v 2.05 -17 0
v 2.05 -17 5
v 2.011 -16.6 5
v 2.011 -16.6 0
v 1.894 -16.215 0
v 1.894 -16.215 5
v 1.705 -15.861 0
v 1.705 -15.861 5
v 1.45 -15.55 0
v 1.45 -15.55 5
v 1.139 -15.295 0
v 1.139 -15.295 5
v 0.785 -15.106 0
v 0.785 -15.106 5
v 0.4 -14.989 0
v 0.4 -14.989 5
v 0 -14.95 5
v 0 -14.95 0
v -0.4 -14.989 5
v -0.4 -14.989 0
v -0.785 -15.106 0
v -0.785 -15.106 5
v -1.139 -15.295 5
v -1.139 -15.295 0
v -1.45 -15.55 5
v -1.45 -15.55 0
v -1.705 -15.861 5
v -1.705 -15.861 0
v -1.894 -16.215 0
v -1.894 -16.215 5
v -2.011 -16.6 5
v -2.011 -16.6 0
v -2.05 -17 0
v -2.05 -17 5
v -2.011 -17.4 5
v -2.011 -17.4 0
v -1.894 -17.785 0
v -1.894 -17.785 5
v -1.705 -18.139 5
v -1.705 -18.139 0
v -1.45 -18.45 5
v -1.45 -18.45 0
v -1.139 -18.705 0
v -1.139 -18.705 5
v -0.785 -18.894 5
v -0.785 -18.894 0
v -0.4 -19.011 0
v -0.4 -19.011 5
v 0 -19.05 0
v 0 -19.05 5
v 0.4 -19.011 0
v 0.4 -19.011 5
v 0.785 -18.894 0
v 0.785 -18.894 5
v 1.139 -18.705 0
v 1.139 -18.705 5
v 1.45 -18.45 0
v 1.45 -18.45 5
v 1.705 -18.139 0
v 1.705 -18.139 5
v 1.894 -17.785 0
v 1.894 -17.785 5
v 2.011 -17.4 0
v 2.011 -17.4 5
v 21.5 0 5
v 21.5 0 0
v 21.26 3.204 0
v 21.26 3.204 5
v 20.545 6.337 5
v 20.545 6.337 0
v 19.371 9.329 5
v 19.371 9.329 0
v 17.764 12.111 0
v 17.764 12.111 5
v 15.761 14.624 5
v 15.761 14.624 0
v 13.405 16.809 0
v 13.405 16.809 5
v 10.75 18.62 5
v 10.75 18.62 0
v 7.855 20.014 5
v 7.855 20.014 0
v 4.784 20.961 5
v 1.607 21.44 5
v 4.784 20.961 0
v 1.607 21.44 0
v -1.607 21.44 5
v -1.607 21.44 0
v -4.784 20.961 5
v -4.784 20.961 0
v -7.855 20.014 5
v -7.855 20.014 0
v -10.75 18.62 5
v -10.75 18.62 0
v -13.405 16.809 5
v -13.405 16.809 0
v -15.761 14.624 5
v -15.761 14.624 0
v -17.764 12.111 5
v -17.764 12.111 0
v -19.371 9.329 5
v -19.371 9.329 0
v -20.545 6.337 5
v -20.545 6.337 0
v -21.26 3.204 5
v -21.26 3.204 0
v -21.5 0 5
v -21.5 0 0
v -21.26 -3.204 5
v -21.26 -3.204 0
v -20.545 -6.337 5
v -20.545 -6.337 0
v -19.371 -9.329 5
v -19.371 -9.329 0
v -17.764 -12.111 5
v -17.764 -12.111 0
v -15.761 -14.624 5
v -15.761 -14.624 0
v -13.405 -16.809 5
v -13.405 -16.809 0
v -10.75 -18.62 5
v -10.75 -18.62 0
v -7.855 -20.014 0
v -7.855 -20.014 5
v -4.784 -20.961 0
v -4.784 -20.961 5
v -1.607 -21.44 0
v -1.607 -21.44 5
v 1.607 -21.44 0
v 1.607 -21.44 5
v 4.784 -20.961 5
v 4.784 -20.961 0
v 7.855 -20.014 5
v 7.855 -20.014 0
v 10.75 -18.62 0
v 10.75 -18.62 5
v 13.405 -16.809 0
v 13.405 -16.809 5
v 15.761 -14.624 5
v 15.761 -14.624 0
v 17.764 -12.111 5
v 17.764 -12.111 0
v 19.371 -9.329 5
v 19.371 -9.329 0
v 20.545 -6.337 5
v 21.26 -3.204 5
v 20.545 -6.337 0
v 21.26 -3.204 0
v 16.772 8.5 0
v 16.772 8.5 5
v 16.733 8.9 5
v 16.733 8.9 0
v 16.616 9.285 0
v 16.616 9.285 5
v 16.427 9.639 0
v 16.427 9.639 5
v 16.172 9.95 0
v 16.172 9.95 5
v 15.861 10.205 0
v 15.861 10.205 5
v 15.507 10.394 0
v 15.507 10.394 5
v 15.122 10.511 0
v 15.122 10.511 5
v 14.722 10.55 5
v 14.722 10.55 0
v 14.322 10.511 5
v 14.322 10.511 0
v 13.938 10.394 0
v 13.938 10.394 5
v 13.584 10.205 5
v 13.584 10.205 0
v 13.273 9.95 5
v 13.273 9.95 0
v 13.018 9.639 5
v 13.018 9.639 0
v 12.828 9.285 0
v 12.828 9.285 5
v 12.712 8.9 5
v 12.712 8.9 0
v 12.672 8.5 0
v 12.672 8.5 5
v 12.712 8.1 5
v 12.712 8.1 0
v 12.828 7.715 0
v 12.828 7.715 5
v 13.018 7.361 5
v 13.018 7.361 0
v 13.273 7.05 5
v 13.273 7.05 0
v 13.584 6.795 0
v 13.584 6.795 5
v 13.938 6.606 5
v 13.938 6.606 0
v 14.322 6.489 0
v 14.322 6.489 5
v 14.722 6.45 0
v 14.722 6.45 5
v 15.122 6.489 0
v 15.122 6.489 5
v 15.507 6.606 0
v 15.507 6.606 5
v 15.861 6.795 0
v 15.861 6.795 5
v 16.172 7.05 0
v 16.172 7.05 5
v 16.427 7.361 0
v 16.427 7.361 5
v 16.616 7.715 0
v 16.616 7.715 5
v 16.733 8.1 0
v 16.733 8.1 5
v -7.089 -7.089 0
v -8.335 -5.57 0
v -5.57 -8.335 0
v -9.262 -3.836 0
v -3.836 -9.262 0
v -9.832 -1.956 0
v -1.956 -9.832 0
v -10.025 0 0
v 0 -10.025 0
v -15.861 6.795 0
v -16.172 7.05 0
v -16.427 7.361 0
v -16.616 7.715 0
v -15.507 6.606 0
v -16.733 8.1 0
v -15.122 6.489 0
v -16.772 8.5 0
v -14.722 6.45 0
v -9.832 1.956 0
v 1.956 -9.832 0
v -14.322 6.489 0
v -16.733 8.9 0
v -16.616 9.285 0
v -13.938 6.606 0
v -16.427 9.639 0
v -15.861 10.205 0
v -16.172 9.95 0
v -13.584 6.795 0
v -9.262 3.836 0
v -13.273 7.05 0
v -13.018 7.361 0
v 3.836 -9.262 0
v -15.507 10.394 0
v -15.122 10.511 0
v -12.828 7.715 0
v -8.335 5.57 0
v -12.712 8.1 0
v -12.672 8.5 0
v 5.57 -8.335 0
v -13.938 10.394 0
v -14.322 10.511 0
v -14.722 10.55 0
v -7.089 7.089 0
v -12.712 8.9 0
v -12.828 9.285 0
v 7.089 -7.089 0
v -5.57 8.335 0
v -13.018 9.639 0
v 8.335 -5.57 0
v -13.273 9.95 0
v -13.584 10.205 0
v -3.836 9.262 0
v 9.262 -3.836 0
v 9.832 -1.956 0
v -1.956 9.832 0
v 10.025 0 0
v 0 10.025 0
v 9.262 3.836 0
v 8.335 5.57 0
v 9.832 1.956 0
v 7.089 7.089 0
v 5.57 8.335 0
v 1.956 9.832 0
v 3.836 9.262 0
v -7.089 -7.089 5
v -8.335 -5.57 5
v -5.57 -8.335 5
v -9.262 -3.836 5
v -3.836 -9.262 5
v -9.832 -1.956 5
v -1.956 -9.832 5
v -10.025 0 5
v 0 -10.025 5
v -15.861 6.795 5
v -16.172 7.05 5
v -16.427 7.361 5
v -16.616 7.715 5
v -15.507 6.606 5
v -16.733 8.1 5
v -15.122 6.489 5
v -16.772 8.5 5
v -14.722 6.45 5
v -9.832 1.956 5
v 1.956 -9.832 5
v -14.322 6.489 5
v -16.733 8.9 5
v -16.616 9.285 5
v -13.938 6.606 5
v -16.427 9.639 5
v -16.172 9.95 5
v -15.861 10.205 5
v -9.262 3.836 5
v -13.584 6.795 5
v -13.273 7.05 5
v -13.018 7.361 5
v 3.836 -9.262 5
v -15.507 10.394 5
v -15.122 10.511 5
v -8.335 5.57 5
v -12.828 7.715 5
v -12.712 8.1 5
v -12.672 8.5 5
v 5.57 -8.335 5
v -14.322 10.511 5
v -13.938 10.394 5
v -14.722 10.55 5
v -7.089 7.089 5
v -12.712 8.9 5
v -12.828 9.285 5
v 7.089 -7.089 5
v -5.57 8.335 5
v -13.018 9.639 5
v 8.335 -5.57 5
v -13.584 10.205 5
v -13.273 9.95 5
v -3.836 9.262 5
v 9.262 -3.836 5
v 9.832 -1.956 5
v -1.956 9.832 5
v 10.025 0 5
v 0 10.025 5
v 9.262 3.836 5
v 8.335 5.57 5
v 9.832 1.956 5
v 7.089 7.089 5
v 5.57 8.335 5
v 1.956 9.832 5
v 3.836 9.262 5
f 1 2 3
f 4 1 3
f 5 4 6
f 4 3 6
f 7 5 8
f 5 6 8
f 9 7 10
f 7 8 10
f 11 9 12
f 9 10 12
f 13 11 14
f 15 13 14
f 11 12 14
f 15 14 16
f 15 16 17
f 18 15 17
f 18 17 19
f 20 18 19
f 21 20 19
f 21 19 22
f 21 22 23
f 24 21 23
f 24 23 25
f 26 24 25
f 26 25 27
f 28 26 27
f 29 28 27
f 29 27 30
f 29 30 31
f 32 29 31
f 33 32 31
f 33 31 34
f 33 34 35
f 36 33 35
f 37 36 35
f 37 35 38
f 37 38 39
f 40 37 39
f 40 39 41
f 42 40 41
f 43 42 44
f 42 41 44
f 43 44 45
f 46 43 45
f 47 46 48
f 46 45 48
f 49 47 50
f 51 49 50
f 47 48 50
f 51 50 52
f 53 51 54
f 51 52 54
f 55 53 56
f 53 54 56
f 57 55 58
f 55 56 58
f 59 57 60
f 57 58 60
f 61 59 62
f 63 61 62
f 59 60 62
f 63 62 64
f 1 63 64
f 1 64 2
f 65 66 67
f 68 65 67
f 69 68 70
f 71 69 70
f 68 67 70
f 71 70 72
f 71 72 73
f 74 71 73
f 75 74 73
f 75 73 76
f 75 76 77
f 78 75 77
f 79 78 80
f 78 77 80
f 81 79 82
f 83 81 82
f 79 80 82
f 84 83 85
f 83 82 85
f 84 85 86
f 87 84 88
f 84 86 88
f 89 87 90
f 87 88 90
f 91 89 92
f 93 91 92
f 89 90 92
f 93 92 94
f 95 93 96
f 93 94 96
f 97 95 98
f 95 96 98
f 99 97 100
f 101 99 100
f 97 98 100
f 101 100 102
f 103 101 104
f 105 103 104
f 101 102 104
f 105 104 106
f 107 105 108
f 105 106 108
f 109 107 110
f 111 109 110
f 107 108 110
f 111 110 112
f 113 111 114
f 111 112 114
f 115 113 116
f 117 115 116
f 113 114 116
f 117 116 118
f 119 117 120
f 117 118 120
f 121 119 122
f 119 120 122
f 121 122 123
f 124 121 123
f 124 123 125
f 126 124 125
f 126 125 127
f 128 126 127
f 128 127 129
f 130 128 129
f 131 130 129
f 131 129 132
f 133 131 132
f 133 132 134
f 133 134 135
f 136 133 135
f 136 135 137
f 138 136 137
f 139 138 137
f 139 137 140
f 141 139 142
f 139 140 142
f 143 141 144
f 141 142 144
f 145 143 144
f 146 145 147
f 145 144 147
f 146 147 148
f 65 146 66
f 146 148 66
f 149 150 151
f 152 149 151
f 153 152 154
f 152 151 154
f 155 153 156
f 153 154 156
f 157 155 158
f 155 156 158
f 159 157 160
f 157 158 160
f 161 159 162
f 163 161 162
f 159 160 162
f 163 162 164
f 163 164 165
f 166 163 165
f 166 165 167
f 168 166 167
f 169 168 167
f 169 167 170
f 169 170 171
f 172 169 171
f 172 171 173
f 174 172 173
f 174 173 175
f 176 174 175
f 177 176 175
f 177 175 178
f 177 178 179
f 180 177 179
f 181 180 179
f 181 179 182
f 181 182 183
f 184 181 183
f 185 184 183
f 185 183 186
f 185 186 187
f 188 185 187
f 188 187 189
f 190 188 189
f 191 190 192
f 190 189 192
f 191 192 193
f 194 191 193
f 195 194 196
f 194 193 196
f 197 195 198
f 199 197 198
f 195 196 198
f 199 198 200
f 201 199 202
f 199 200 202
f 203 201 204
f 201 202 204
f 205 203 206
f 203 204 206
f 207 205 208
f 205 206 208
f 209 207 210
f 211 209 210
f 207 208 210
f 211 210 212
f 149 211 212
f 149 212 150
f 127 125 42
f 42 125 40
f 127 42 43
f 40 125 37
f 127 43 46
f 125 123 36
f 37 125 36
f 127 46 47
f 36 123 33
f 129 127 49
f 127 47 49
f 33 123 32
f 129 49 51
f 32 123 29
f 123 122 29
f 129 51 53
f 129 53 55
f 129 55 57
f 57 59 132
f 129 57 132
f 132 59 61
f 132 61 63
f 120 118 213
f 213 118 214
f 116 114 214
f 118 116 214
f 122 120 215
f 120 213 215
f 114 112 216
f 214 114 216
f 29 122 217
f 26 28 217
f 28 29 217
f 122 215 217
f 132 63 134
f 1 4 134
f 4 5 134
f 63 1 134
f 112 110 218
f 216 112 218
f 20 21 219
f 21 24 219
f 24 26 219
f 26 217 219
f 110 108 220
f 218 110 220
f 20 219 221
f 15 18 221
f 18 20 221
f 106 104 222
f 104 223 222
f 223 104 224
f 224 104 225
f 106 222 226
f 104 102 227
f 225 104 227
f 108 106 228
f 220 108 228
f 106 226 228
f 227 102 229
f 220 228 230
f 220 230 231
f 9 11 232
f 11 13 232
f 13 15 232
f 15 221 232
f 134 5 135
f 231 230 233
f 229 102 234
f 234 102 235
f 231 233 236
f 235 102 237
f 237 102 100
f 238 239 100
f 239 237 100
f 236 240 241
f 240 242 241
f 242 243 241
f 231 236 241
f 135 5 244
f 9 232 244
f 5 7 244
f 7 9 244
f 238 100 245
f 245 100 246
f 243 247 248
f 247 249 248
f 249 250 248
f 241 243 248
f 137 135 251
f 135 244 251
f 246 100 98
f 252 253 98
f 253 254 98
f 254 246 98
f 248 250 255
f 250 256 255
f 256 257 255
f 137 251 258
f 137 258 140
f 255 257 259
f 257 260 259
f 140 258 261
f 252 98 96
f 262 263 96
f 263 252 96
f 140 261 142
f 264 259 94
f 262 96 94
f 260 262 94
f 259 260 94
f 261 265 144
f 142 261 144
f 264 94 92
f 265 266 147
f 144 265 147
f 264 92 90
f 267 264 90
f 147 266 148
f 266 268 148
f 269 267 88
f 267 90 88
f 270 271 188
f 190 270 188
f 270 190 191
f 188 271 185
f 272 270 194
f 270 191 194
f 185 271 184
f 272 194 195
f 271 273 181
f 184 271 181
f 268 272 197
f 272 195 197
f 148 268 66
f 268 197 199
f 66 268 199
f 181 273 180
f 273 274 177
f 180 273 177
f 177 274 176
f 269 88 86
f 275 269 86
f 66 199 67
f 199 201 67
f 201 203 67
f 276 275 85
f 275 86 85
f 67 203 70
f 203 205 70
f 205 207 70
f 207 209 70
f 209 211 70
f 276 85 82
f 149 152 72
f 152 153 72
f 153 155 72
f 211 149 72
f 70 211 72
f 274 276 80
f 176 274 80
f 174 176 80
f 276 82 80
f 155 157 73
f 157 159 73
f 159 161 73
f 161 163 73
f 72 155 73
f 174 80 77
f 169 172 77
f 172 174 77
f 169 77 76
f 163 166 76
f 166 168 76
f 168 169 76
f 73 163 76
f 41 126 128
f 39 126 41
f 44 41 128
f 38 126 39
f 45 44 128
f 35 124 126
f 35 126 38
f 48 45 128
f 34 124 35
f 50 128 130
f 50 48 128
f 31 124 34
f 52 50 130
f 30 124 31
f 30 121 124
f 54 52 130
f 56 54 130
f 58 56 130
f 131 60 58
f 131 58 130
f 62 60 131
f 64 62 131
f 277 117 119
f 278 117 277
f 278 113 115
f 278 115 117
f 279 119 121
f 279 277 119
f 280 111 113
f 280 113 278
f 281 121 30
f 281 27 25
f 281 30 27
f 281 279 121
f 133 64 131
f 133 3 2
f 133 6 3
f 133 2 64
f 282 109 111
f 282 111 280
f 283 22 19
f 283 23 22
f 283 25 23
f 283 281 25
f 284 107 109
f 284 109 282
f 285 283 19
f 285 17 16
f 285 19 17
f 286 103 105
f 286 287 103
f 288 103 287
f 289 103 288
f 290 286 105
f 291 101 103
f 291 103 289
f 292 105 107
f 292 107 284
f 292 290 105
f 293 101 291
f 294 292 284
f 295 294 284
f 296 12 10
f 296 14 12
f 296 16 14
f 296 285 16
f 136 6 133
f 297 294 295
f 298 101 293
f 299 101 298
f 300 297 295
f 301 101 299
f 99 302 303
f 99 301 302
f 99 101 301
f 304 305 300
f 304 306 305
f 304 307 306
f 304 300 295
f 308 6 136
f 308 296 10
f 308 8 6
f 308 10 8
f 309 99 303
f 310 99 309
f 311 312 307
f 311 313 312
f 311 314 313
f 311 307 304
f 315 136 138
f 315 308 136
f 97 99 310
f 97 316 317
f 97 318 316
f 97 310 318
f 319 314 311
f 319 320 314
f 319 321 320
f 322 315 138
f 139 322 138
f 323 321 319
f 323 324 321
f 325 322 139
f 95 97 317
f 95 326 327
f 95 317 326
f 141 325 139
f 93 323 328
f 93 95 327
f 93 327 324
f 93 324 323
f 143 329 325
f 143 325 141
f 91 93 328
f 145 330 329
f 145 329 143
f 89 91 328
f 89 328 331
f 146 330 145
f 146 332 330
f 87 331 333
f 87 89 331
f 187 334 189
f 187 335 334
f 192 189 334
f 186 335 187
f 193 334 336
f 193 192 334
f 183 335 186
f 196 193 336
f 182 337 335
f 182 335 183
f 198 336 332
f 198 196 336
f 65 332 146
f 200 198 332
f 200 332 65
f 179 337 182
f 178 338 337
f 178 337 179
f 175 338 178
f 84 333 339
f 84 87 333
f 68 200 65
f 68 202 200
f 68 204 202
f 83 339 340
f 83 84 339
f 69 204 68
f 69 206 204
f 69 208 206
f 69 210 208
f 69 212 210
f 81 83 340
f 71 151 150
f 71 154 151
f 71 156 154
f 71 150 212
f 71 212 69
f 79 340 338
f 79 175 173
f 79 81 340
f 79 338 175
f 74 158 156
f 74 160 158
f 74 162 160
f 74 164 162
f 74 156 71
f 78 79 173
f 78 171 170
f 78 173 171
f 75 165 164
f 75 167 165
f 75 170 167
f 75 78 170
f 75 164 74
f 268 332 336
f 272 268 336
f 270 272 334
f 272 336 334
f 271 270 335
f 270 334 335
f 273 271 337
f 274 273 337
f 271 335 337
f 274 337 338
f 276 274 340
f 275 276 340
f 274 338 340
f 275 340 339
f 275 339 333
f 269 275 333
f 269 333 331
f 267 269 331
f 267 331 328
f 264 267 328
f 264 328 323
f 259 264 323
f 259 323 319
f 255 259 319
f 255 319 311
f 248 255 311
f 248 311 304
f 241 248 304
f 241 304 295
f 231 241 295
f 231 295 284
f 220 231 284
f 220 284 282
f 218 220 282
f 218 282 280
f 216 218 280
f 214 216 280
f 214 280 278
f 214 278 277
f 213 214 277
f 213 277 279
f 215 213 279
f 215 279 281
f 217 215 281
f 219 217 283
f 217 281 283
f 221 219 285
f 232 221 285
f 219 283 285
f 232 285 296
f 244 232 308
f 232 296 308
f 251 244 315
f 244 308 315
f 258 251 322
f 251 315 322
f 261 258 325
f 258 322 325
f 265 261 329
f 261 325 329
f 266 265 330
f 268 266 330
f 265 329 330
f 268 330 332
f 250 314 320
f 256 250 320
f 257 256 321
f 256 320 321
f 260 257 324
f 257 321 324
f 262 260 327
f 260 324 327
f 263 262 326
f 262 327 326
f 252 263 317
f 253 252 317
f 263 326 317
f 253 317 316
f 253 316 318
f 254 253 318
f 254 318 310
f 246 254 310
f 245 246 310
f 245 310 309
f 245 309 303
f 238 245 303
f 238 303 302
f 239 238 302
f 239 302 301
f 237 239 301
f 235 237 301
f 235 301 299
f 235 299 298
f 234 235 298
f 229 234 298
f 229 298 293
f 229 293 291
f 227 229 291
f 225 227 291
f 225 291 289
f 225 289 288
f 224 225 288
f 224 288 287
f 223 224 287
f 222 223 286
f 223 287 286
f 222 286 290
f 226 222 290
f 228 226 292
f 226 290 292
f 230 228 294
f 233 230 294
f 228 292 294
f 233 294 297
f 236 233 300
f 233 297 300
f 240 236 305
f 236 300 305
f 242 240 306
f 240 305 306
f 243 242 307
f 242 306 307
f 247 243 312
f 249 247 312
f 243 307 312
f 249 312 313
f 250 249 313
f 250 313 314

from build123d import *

# Parameters (mm, degrees)
SKETCH_1_R          = 21.5
SKETCH_1_R_2        = 18
EXTRUDE_1_DEPTH     = 5
SKETCH_2_R          = 10.025
CUT_EXTRUDE_1_DEPTH = 31.813957876
SKETCH_3_R          = 2.05
CUT_EXTRUDE_2_DEPTH = 31.813957876


with BuildPart() as part:
    # ｽｹｯﾁ1 → ﾎﾞｽ - 押し出し1 (new body)
    with BuildSketch(Plane.XY):
        Circle(SKETCH_1_R)
        Circle(SKETCH_1_R_2, mode=Mode.SUBTRACT)
        Circle(SKETCH_1_R_2)
    extrude(amount=EXTRUDE_1_DEPTH)

    # ｽｹｯﾁ2 → ｶｯﾄ - 押し出し1 (cut, through all)
    with BuildSketch(Plane.XY.offset(5)):
        Circle(SKETCH_2_R)
    extrude(amount=-CUT_EXTRUDE_1_DEPTH, mode=Mode.SUBTRACT)

    # ｽｹｯﾁ3 → ｶｯﾄ - 押し出し2 (cut, through all)
    with BuildSketch(Plane.XY.offset(5)):
        with Locations((0, -17)):
            Circle(SKETCH_3_R)
        with Locations((-14.722431864, 8.5)):
            Circle(SKETCH_3_R)
        with Locations((14.722431864, 8.5)):
            Circle(SKETCH_3_R)
    extrude(amount=-CUT_EXTRUDE_2_DEPTH, mode=Mode.SUBTRACT)


solid = part.part
